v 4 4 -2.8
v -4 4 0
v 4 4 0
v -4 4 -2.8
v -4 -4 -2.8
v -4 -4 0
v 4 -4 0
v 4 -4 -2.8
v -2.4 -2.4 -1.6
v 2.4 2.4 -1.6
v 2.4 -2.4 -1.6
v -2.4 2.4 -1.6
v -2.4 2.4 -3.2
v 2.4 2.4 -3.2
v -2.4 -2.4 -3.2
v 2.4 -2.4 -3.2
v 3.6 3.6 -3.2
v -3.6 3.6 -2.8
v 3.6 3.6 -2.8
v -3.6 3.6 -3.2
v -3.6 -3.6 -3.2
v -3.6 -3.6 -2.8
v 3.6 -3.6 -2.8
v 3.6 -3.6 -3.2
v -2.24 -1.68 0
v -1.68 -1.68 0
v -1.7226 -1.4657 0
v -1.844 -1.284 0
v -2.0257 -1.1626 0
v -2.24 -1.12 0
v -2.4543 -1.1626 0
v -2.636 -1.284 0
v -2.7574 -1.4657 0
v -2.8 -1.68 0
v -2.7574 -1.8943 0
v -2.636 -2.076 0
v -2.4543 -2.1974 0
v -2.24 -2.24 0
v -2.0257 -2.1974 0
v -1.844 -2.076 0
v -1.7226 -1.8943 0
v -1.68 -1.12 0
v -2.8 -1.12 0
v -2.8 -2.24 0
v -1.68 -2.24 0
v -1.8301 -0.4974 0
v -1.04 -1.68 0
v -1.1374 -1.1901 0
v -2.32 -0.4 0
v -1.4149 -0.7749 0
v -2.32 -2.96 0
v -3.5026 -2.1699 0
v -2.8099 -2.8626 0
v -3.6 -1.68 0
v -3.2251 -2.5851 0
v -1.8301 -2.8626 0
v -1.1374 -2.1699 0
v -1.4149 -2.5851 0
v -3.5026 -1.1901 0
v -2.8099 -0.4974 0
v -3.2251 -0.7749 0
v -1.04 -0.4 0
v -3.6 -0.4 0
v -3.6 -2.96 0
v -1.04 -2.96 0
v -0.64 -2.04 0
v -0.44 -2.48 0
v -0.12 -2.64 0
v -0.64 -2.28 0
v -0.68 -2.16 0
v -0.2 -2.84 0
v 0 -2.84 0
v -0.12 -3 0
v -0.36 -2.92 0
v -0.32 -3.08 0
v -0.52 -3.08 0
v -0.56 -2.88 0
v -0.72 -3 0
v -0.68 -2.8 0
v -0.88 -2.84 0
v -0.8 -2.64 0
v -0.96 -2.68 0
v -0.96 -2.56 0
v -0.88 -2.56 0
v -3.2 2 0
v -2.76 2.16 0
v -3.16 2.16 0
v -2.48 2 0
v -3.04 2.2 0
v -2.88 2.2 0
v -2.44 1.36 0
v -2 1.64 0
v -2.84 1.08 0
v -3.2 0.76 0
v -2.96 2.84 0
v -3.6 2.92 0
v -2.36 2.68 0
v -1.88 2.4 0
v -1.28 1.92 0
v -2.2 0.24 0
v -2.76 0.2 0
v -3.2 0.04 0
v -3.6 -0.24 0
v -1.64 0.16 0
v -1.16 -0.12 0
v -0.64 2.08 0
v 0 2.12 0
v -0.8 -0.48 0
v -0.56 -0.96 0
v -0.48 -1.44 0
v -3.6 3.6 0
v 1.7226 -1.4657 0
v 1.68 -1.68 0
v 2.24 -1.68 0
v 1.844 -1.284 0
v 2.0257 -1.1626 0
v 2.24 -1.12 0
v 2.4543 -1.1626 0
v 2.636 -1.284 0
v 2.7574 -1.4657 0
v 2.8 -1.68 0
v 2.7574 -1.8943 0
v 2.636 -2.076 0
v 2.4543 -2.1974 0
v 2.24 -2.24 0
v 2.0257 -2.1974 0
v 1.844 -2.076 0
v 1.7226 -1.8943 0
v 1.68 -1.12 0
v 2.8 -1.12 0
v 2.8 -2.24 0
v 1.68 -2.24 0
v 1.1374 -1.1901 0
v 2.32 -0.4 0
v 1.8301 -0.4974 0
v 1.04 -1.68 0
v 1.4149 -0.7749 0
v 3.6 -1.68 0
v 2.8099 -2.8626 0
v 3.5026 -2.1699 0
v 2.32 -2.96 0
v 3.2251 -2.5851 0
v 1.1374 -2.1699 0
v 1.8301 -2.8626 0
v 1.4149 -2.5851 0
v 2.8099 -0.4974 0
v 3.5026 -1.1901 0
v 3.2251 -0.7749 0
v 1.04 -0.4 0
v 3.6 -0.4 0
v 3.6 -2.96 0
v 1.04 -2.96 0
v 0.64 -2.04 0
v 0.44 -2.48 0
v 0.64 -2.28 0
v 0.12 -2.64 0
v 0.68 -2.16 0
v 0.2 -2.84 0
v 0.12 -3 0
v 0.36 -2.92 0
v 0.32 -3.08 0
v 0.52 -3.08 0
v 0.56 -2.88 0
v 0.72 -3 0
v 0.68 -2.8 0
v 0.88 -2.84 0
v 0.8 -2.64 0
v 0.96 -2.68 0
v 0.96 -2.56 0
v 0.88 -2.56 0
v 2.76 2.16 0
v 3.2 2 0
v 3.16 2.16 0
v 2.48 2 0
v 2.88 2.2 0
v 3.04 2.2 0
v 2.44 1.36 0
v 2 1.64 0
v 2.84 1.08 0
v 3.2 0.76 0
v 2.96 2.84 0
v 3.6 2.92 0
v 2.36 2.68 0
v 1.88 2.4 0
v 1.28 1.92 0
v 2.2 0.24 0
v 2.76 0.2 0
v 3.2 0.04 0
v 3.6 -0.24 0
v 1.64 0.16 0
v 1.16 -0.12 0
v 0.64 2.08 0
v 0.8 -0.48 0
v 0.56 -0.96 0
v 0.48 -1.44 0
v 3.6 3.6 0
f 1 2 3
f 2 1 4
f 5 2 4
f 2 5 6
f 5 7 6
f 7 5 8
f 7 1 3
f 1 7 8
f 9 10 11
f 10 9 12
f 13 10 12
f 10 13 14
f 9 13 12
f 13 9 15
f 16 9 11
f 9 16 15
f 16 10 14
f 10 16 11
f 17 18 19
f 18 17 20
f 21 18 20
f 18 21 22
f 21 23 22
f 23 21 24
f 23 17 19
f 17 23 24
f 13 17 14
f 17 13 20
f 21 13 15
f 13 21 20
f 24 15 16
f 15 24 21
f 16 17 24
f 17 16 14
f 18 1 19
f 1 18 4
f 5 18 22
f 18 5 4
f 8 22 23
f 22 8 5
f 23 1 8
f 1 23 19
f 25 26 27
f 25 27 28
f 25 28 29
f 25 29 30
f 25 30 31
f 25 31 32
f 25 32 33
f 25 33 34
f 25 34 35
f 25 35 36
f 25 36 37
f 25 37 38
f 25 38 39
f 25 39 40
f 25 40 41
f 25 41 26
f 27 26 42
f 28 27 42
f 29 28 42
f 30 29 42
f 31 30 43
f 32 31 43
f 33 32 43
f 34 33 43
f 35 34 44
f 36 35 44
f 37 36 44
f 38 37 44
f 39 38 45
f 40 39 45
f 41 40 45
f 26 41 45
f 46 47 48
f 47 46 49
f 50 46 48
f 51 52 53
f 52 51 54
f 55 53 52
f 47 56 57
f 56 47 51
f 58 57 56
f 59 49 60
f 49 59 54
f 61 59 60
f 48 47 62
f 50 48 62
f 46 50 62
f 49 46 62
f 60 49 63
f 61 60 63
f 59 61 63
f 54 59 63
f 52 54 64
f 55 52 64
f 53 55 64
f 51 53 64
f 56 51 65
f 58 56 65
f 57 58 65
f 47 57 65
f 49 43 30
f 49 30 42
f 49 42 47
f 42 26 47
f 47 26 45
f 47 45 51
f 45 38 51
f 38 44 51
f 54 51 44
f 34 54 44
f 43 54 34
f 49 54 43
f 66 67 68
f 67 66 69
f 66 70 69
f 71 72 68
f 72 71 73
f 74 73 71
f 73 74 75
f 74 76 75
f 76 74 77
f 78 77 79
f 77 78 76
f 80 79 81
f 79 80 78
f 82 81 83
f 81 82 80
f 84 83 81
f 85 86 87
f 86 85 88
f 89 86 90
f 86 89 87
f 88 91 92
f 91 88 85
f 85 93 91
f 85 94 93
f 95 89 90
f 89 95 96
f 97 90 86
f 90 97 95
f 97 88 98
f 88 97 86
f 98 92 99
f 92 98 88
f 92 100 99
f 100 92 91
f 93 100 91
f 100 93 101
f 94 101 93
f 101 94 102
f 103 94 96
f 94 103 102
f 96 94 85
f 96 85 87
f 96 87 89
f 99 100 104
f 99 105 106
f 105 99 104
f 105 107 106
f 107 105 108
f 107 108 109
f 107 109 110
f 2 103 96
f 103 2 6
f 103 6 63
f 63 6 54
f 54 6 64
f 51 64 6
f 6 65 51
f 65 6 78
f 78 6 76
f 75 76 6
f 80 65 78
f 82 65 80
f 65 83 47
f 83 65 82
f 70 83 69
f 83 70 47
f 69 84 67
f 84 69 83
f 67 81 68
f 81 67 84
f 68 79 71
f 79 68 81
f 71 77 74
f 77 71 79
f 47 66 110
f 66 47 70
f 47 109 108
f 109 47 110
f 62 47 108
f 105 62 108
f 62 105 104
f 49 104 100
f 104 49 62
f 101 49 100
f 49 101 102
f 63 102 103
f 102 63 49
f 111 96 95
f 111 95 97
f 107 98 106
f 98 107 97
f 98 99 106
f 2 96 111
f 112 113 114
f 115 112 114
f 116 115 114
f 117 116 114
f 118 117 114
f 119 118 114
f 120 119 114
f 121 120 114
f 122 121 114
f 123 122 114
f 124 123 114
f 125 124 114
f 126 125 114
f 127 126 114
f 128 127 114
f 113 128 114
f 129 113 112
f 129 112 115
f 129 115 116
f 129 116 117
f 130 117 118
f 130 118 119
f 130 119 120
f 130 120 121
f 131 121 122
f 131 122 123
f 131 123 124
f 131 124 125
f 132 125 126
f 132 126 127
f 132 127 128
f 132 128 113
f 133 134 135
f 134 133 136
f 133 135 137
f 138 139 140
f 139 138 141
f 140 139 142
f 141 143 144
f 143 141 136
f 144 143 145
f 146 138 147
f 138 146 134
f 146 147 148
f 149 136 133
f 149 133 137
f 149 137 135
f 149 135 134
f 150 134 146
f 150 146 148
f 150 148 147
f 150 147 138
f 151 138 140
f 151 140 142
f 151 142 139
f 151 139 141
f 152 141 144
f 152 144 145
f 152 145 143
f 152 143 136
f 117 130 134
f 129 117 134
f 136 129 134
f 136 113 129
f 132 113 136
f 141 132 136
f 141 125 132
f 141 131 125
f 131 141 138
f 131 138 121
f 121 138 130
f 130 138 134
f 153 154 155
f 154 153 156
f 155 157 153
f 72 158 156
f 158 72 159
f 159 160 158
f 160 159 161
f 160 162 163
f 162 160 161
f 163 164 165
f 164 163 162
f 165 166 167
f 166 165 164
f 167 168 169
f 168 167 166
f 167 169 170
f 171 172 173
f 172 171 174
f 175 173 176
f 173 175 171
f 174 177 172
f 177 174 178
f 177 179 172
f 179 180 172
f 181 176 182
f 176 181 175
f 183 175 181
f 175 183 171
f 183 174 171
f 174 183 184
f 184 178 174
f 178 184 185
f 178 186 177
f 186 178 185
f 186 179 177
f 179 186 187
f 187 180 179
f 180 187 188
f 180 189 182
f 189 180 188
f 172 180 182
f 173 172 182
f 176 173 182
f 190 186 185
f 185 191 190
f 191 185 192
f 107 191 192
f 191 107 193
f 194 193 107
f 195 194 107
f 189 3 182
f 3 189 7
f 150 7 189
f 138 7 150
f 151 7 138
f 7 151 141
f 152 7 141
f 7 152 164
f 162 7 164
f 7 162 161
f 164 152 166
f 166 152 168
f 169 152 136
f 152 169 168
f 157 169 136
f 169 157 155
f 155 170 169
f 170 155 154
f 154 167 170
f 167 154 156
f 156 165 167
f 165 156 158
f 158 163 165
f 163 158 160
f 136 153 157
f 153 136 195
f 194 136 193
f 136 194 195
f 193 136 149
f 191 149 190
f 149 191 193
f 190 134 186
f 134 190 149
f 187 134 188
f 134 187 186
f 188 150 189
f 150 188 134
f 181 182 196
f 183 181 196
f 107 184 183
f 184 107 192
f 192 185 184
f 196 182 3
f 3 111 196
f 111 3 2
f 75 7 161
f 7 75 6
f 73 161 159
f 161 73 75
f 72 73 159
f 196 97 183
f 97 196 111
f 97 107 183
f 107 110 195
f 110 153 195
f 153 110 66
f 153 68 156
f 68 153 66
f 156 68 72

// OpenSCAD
// file: ../p/box5.scad
use <../lib.scad>
function ldraw_lib__box5() = [
// 0 Box with 5 Faces and All Edges
// 0 Name: box5.dat
// 0 Author: James Jessiman
// 0 !LDRAW_ORG Primitive UPDATE 2012-01
// 0 !LICENSE Licensed under CC BY 4.0 : see CAreadme.txt
// 
// 0 BFC CERTIFY CCW
  [0,"BFC","CERTIFY"],
  [0,"BFC","CCW"],
// 
// 0 !HISTORY 2002-04-03 [sbliss] Modified for BFC compliance
// 0 !HISTORY 2002-04-25 [PTadmin] Official Update 2002-02
// 0 !HISTORY 2007-06-24 [PTadmin] Header formatted for Contributor Agreement
// 0 !HISTORY 2008-07-01 [PTadmin] Official Update 2008-01
// 0 !HISTORY 2012-02-16 [Philo] Changed to CCW
// 0 !HISTORY 2012-03-30 [PTadmin] Official Update 2012-01
// 
// 
// 2 24 1 1 1 -1 1 1
  [2,24,1,1,1,-1,1,1],
// 2 24 -1 1 1 -1 1 -1
  [2,24,-1,1,1,-1,1,-1],
// 2 24 -1 1 -1 1 1 -1
  [2,24,-1,1,-1,1,1,-1],
// 2 24 1 1 -1 1 1 1
  [2,24,1,1,-1,1,1,1],
// 2 24 1 0 1 -1 0 1
  [2,24,1,0,1,-1,0,1],
// 2 24 -1 0 1 -1 0 -1
  [2,24,-1,0,1,-1,0,-1],
// 2 24 -1 0 -1 1 0 -1
  [2,24,-1,0,-1,1,0,-1],
// 2 24 1 0 -1 1 0 1
  [2,24,1,0,-1,1,0,1],
// 2 24 1 0 1 1 1 1
  [2,24,1,0,1,1,1,1],
// 2 24 -1 0 1 -1 1 1
  [2,24,-1,0,1,-1,1,1],
// 2 24 1 0 -1 1 1 -1
  [2,24,1,0,-1,1,1,-1],
// 2 24 -1 0 -1 -1 1 -1
  [2,24,-1,0,-1,-1,1,-1],
// 4 16 -1 1 1 1 1 1 1 1 -1 -1 1 -1
  [4,16,-1,1,1,1,1,1,1,1,-1,-1,1,-1],
// 4 16 -1 1 1 -1 0 1 1 0 1 1 1 1
  [4,16,-1,1,1,-1,0,1,1,0,1,1,1,1],
// 4 16 -1 1 -1 -1 0 -1 -1 0 1 -1 1 1
  [4,16,-1,1,-1,-1,0,-1,-1,0,1,-1,1,1],
// 4 16 1 1 -1 1 0 -1 -1 0 -1 -1 1 -1
  [4,16,1,1,-1,1,0,-1,-1,0,-1,-1,1,-1],
// 4 16 1 1 1 1 0 1 1 0 -1 1 1 -1
  [4,16,1,1,1,1,0,1,1,0,-1,1,1,-1],
];
module ldraw_lib__box5(step=0, col=false, unit=2/5, alt=false, line=0.2, solid=!$preview)
    makepoly(ldraw_lib__box5(), step=step, col=col, unit=unit, alt=alt, line=line, solid=solid);
ldraw_lib__box5(line=0.2);
// file: ../p/box4.scad
use <../lib.scad>
function ldraw_lib__box4() = [
// 0 Box with 4 Faces (2 Parallel Pairs) and All Edges
// 0 Name: box4.dat
// 0 Author: James Jessiman
// 0 !LDRAW_ORG Primitive UPDATE 2012-01
// 0 !LICENSE Licensed under CC BY 4.0 : see CAreadme.txt
// 
// 0 BFC CERTIFY CCW
  [0,"BFC","CERTIFY"],
  [0,"BFC","CCW"],
// 
// 0 !HISTORY 2002-04-03 [sbliss] Modified for BFC compliance
// 0 !HISTORY 2002-04-25 [PTadmin] Official Update 2002-02
// 0 !HISTORY 2007-06-24 [PTadmin] Header formatted for Contributor Agreement
// 0 !HISTORY 2008-07-01 [PTadmin] Official Update 2008-01
// 0 !HISTORY 2012-02-16 [Philo] Changed to CCW
// 0 !HISTORY 2012-03-30 [PTadmin] Official Update 2012-01
// 
// 
// 2 24 1 1 1 -1 1 1
  [2,24,1,1,1,-1,1,1],
// 2 24 -1 1 1 -1 1 -1
  [2,24,-1,1,1,-1,1,-1],
// 2 24 -1 1 -1 1 1 -1
  [2,24,-1,1,-1,1,1,-1],
// 2 24 1 1 -1 1 1 1
  [2,24,1,1,-1,1,1,1],
// 2 24 1 0 1 -1 0 1
  [2,24,1,0,1,-1,0,1],
// 2 24 -1 0 1 -1 0 -1
  [2,24,-1,0,1,-1,0,-1],
// 2 24 -1 0 -1 1 0 -1
  [2,24,-1,0,-1,1,0,-1],
// 2 24 1 0 -1 1 0 1
  [2,24,1,0,-1,1,0,1],
// 2 24 1 0 1 1 1 1
  [2,24,1,0,1,1,1,1],
// 2 24 -1 0 1 -1 1 1
  [2,24,-1,0,1,-1,1,1],
// 2 24 1 0 -1 1 1 -1
  [2,24,1,0,-1,1,1,-1],
// 2 24 -1 0 -1 -1 1 -1
  [2,24,-1,0,-1,-1,1,-1],
// 4 16 -1 1 1 -1 0 1 1 0 1 1 1 1
  [4,16,-1,1,1,-1,0,1,1,0,1,1,1,1],
// 4 16 -1 1 -1 -1 0 -1 -1 0 1 -1 1 1
  [4,16,-1,1,-1,-1,0,-1,-1,0,1,-1,1,1],
// 4 16 1 1 -1 1 0 -1 -1 0 -1 -1 1 -1
  [4,16,1,1,-1,1,0,-1,-1,0,-1,-1,1,-1],
// 4 16 1 1 1 1 0 1 1 0 -1 1 1 -1
  [4,16,1,1,1,1,0,1,1,0,-1,1,1,-1],
];
module ldraw_lib__box4(step=0, col=false, unit=2/5, alt=false, line=0.2, solid=!$preview)
    makepoly(ldraw_lib__box4(), step=step, col=col, unit=unit, alt=alt, line=line, solid=solid);
ldraw_lib__box4(line=0.2);
// file: ../p/4-4ndis.scad
use <../lib.scad>
function ldraw_lib__4_4ndis() = [
// 0 Disc Negative 1.0
// 0 Name: 4-4ndis.dat
// 0 Author: James Jessiman
// 0 !LDRAW_ORG Primitive UPDATE 2012-01
// 0 !LICENSE Licensed under CC BY 4.0 : see CAreadme.txt
// 
// 0 BFC CERTIFY CCW
  [0,"BFC","CERTIFY"],
  [0,"BFC","CCW"],
// 
// 0 !HISTORY 2002-03-23 [sbliss] Added BFC statement; compacted code
// 0 !HISTORY 2002-04-25 [PTadmin] Official Update 2002-02
// 0 !HISTORY 2007-06-24 [PTadmin] Header formatted for Contributor Agreement
// 0 !HISTORY 2008-07-01 [PTadmin] Official Update 2008-01
// 0 !HISTORY 2012-02-16 [Philo] Changed to CCW
// 0 !HISTORY 2012-03-30 [PTadmin] Official Update 2012-01
// 
// 
// 3 16 0.9239 0 0.3827 1 0 0 1 0 1
  [3,16,0.9239,0,0.3827,1,0,0,1,0,1],
// 3 16 0.7071 0 0.7071 0.9239 0 0.3827 1 0 1
  [3,16,0.7071,0,0.7071,0.9239,0,0.3827,1,0,1],
// 3 16 0.3827 0 0.9239 0.7071 0 0.7071 1 0 1
  [3,16,0.3827,0,0.9239,0.7071,0,0.7071,1,0,1],
// 3 16 0 0 1 0.3827 0 0.9239 1 0 1
  [3,16,0,0,1,0.3827,0,0.9239,1,0,1],
// 3 16 -0.3827 0 0.9239 0 0 1 -1 0 1
  [3,16,-0.3827,0,0.9239,0,0,1,-1,0,1],
// 3 16 -0.7071 0 0.7071 -0.3827 0 0.9239 -1 0 1
  [3,16,-0.7071,0,0.7071,-0.3827,0,0.9239,-1,0,1],
// 3 16 -0.9239 0 0.3827 -0.7071 0 0.7071 -1 0 1
  [3,16,-0.9239,0,0.3827,-0.7071,0,0.7071,-1,0,1],
// 3 16 -1 0 0 -0.9239 0 0.3827 -1 0 1
  [3,16,-1,0,0,-0.9239,0,0.3827,-1,0,1],
// 3 16 -0.9239 0 -0.3827 -1 0 0 -1 0 -1
  [3,16,-0.9239,0,-0.3827,-1,0,0,-1,0,-1],
// 3 16 -0.7071 0 -0.7071 -0.9239 0 -0.3827 -1 0 -1
  [3,16,-0.7071,0,-0.7071,-0.9239,0,-0.3827,-1,0,-1],
// 3 16 -0.3827 0 -0.9239 -0.7071 0 -0.7071 -1 0 -1
  [3,16,-0.3827,0,-0.9239,-0.7071,0,-0.7071,-1,0,-1],
// 3 16 0 0 -1 -0.3827 0 -0.9239 -1 0 -1
  [3,16,0,0,-1,-0.3827,0,-0.9239,-1,0,-1],
// 3 16 0.3827 0 -0.9239 0 0 -1 1 0 -1
  [3,16,0.3827,0,-0.9239,0,0,-1,1,0,-1],
// 3 16 0.7071 0 -0.7071 0.3827 0 -0.9239 1 0 -1
  [3,16,0.7071,0,-0.7071,0.3827,0,-0.9239,1,0,-1],
// 3 16 0.9239 0 -0.3827 0.7071 0 -0.7071 1 0 -1
  [3,16,0.9239,0,-0.3827,0.7071,0,-0.7071,1,0,-1],
// 3 16 1 0 0 0.9239 0 -0.3827 1 0 -1
  [3,16,1,0,0,0.9239,0,-0.3827,1,0,-1],
];
module ldraw_lib__4_4ndis(step=0, col=false, unit=2/5, alt=false, line=0.2, solid=!$preview)
    makepoly(ldraw_lib__4_4ndis(), step=step, col=col, unit=unit, alt=alt, line=line, solid=solid);
ldraw_lib__4_4ndis(line=0.2);
// file: ../p/4-4disc.scad
use <../lib.scad>
function ldraw_lib__4_4disc() = [
// 0 Disc 1.0
// 0 Name: 4-4disc.dat
// 0 Author: James Jessiman
// 0 !LDRAW_ORG Primitive UPDATE 2002-02
// 0 !LICENSE Licensed under CC BY 4.0 : see CAreadme.txt
// 
// 0 BFC CERTIFY CCW
  [0,"BFC","CERTIFY"],
  [0,"BFC","CCW"],
// 
// 0 !HISTORY 1998-12-15 [PTadmin] Official Update 1998-10
// 0 !HISTORY 2002-03-23 [sbliss] Added BFC statement
// 0 !HISTORY 2002-04-25 [PTadmin] Official Update 2002-02
// 0 !HISTORY 2007-06-24 [PTadmin] Header formatted for Contributor Agreement
// 0 !HISTORY 2008-07-01 [PTadmin] Official Update 2008-01
// 
// 
// 3 16 0 0 0 1 0 0 0.9239 0 0.3827
  [3,16,0,0,0,1,0,0,0.9239,0,0.3827],
// 3 16 0 0 0 0.9239 0 0.3827 0.7071 0 0.7071
  [3,16,0,0,0,0.9239,0,0.3827,0.7071,0,0.7071],
// 3 16 0 0 0 0.7071 0 0.7071 0.3827 0 0.9239
  [3,16,0,0,0,0.7071,0,0.7071,0.3827,0,0.9239],
// 3 16 0 0 0 0.3827 0 0.9239 0 0 1
  [3,16,0,0,0,0.3827,0,0.9239,0,0,1],
// 3 16 0 0 0 0 0 1 -0.3827 0 0.9239
  [3,16,0,0,0,0,0,1,-0.3827,0,0.9239],
// 3 16 0 0 0 -0.3827 0 0.9239 -0.7071 0 0.7071
  [3,16,0,0,0,-0.3827,0,0.9239,-0.7071,0,0.7071],
// 3 16 0 0 0 -0.7071 0 0.7071 -0.9239 0 0.3827
  [3,16,0,0,0,-0.7071,0,0.7071,-0.9239,0,0.3827],
// 3 16 0 0 0 -0.9239 0 0.3827 -1 0 -0
  [3,16,0,0,0,-0.9239,0,0.3827,-1,0,-0],
// 3 16 0 0 0 -1 0 -0 -0.9239 0 -0.3827
  [3,16,0,0,0,-1,0,-0,-0.9239,0,-0.3827],
// 3 16 0 0 0 -0.9239 0 -0.3827 -0.7071 0 -0.7071
  [3,16,0,0,0,-0.9239,0,-0.3827,-0.7071,0,-0.7071],
// 3 16 0 0 0 -0.7071 0 -0.7071 -0.3827 0 -0.9239
  [3,16,0,0,0,-0.7071,0,-0.7071,-0.3827,0,-0.9239],
// 3 16 0 0 0 -0.3827 0 -0.9239 0 0 -1
  [3,16,0,0,0,-0.3827,0,-0.9239,0,0,-1],
// 3 16 0 0 0 0 0 -1 0.3827 0 -0.9239
  [3,16,0,0,0,0,0,-1,0.3827,0,-0.9239],
// 3 16 0 0 0 0.3827 0 -0.9239 0.7071 0 -0.7071
  [3,16,0,0,0,0.3827,0,-0.9239,0.7071,0,-0.7071],
// 3 16 0 0 0 0.7071 0 -0.7071 0.9239 0 -0.3827
  [3,16,0,0,0,0.7071,0,-0.7071,0.9239,0,-0.3827],
// 3 16 0 0 0 0.9239 0 -0.3827 1 0 0
  [3,16,0,0,0,0.9239,0,-0.3827,1,0,0],
// 0
];
module ldraw_lib__4_4disc(step=0, col=false, unit=2/5, alt=false, line=0.2, solid=!$preview)
    makepoly(ldraw_lib__4_4disc(), step=step, col=col, unit=unit, alt=alt, line=line, solid=solid);
ldraw_lib__4_4disc(line=0.2);
// file: ../p/1-4chrd.scad
use <../lib.scad>
function ldraw_lib__1_4chrd() = [
// 0 Chord 0.25
// 0 Name: 1-4chrd.dat
// 0 Author: Max Martin Richter [MMR1988]
// 0 !LDRAW_ORG Primitive UPDATE 2023-05
// 0 !LICENSE Licensed under CC BY 4.0 : see CAreadme.txt
// 
// 0 BFC CERTIFY CCW
  [0,"BFC","CERTIFY"],
  [0,"BFC","CCW"],
// 
// 0 !HISTORY 2004-04-22 [PTadmin] Official Update 2004-02
// 0 !HISTORY 2007-10-09 [PTadmin] Header formatted for Contributor Agreement
// 0 !HISTORY 2008-07-01 [PTadmin] Official Update 2008-01
// 0 !HISTORY 2012-08-02 [MMR1988] Re-creation with PrimGen2 and Rectifier
// 0 !HISTORY 2012-08-09 [PTadmin] Official Update 2012-02
// 0 !HISTORY 2023-10-27 [OrionP] Change author to MMR1988 from hafhead
// 0 !HISTORY 2023-10-31 [OrionP] Official Update 2023-05
// 
// 4 16 0.9239 0 0.3827 0.3827 0 0.9239 0 0 1 1 0 0
  [4,16,0.9239,0,0.3827,0.3827,0,0.9239,0,0,1,1,0,0],
// 3 16 0.7071 0 0.7071 0.3827 0 0.9239 0.9239 0 0.3827
  [3,16,0.7071,0,0.7071,0.3827,0,0.9239,0.9239,0,0.3827],
];
module ldraw_lib__1_4chrd(step=0, col=false, unit=2/5, alt=false, line=0.2, solid=!$preview)
    makepoly(ldraw_lib__1_4chrd(), step=step, col=col, unit=unit, alt=alt, line=line, solid=solid);
ldraw_lib__1_4chrd(line=0.2);
// file: s/3070bs01.scad
use <../../lib.scad>
use <../../p/box4.scad>
use <../../p/box5.scad>
function ldraw_lib__s__3070bs01() = [
// 0 ~Tile  1 x  1 with Groove without Top Face
// 0 Name: s\3070bs01.dat
// 0 Author: Chris Dee [cwdee]
// 0 !LDRAW_ORG Subpart UPDATE 2009-02
// 0 !LICENSE Licensed under CC BY 4.0 : see CAreadme.txt
// 
// 0 BFC CERTIFY CCW
  [0,"BFC","CERTIFY"],
  [0,"BFC","CCW"],
// 
// 0 !HISTORY 2009-09-03 [PTadmin] Official Update 2009-02
// 
// 
// 1 16 0 0 0 10 0 0 0 7 0 0 0 10 box4.dat
  [1,16,0,0,0,10,0,0,0,7,0,0,0,10, ldraw_lib__box4()],
// 0 BFC INVERTNEXT
  [0,"BFC","INVERTNEXT"],
// 1 16 0 8 0 6 0 0 0 -4 0 0 0 6 box5.dat
  [1,16,0,8,0,6,0,0,0,-4,0,0,0,6, ldraw_lib__box5()],
// 1 16 0 7 0 9 0 0 0 1 0 0 0 9 box4.dat
  [1,16,0,7,0,9,0,0,0,1,0,0,0,9, ldraw_lib__box4()],
// 
// 4 16 9 8 9 6 8 6 -6 8 6 -9 8 9
  [4,16,9,8,9,6,8,6,-6,8,6,-9,8,9],
// 4 16 -9 8 9 -6 8 6 -6 8 -6 -9 8 -9
  [4,16,-9,8,9,-6,8,6,-6,8,-6,-9,8,-9],
// 4 16 -9 8 -9 -6 8 -6 6 8 -6 9 8 -9
  [4,16,-9,8,-9,-6,8,-6,6,8,-6,9,8,-9],
// 4 16 9 8 -9 6 8 -6 6 8 6 9 8 9
  [4,16,9,8,-9,6,8,-6,6,8,6,9,8,9],
// 
// 4 16 10 7 10 9 7 9 -9 7 9 -10 7 10
  [4,16,10,7,10,9,7,9,-9,7,9,-10,7,10],
// 4 16 -10 7 10 -9 7 9 -9 7 -9 -10 7 -10
  [4,16,-10,7,10,-9,7,9,-9,7,-9,-10,7,-10],
// 4 16 -10 7 -10 -9 7 -9 9 7 -9 10 7 -10
  [4,16,-10,7,-10,-9,7,-9,9,7,-9,10,7,-10],
// 4 16 10 7 -10 9 7 -9 9 7 9 10 7 10
  [4,16,10,7,-10,9,7,-9,9,7,9,10,7,10],
// 0
];
module ldraw_lib__s__3070bs01(step=0, col=false, unit=2/5, alt=false, line=0.2, solid=!$preview)
    makepoly(ldraw_lib__s__3070bs01(), step=step, col=col, unit=unit, alt=alt, line=line, solid=solid);
ldraw_lib__s__3070bs01(line=0.2);
// main file
use <../lib.scad>
use <s/3070bp1is01.scad>
use <s/3070bs01.scad>
function ldraw_lib__3070bp1i() = [
// 0 Tile  1 x  1 with Magenta Cat Face on Bright Pink Background Pattern
// 0 Name: 3070bp1i.dat
// 0 Author: Takeshi Takahashi [RainbowDolphin]
// 0 !LDRAW_ORG Part UPDATE 2025-07
// 0 !LICENSE Licensed under CC BY 4.0 : see CAreadme.txt
// 
// 0 BFC CERTIFY CCW
  [0,"BFC","CERTIFY"],
  [0,"BFC","CCW"],
// 
// 0 !KEYWORDS animal, BrickLink 3070pb184, Dots, Extra, Rebrickable 3070bpr9988
// 0 !KEYWORDS Series 3, Set 41921
// 
// 0 !HISTORY 2025-07-27 [OrionP] Official Update 2025-07
// 
// 1 16 0 0 0 1 0 0 0 1 0 0 0 1 s\3070bs01.dat
  [1,16,0,0,0,1,0,0,0,1,0,0,0,1, ldraw_lib__s__3070bs01()],
// 1 16 0 0 0 1 0 0 0 1 0 0 0 1 s\3070bp1is01.dat
  [1,16,0,0,0,1,0,0,0,1,0,0,0,1, ldraw_lib__s__3070bp1is01()],
// 1 16 0 0 0 -1 0 0 0 1 0 0 0 1 s\3070bp1is01.dat
  [1,16,0,0,0,-1,0,0,0,1,0,0,0,1, ldraw_lib__s__3070bp1is01()],
// 
// 4 16 -10 0 10 -9 0 9 9 0 9 10 0 10
  [4,16,-10,0,10,-9,0,9,9,0,9,10,0,10],
// 4 16 .8 0 -7.7 -.8 0 -7.7 -10 0 -10 10 0 -10
  [4,16,.8,0,-7.7,-.8,0,-7.7,-10,0,-10,10,0,-10],
// 4 16 -.8 0 -7.7 .8 0 -7.7 .3 0 -7.5 -.3 0 -7.5
  [4,16,-.8,0,-7.7,.8,0,-7.7,.3,0,-7.5,-.3,0,-7.5],
// 3 16 0 0 -7.1 -.3 0 -7.5 .3 0 -7.5
  [3,16,0,0,-7.1,-.3,0,-7.5,.3,0,-7.5],
// 
// 4 29 -9 0 9 -5.9 0 6.7 5.9 0 6.7 9 0 9
  [4,29,-9,0,9,-5.9,0,6.7,5.9,0,6.7,9,0,9],
// 3 29 -5.9 0 6.7 0 0 5.3 5.9 0 6.7
  [3,29,-5.9,0,6.7,0,0,5.3,5.9,0,6.7],
// 3 26 0 0 5.3 -1.2 0 -3.6 1.2 0 -3.6
  [3,26,0,0,5.3,-1.2,0,-3.6,1.2,0,-3.6],
// 4 26 1.6 0 -5.1 1.2 0 -3.6 -1.2 0 -3.6 -1.6 0 -5.1
  [4,26,1.6,0,-5.1,1.2,0,-3.6,-1.2,0,-3.6,-1.6,0,-5.1],
// 4 85 .3 0 -6.6 1.6 0 -5.1 -1.6 0 -5.1 -.3 0 -6.6
  [4,85,.3,0,-6.6,1.6,0,-5.1,-1.6,0,-5.1,-.3,0,-6.6],
// 3 85 .3 0 -6.6 -.3 0 -6.6 0 0 -7.1
  [3,85,.3,0,-6.6,-.3,0,-6.6,0,0,-7.1],
];
module ldraw_lib__3070bp1i(step=0, col=false, unit=2/5, alt=false, line=0.2, solid=!$preview)
    makepoly(ldraw_lib__3070bp1i(), step=step, col=col, unit=unit, alt=alt, line=line, solid=solid);
ldraw_lib__3070bp1i(line=0.2);
